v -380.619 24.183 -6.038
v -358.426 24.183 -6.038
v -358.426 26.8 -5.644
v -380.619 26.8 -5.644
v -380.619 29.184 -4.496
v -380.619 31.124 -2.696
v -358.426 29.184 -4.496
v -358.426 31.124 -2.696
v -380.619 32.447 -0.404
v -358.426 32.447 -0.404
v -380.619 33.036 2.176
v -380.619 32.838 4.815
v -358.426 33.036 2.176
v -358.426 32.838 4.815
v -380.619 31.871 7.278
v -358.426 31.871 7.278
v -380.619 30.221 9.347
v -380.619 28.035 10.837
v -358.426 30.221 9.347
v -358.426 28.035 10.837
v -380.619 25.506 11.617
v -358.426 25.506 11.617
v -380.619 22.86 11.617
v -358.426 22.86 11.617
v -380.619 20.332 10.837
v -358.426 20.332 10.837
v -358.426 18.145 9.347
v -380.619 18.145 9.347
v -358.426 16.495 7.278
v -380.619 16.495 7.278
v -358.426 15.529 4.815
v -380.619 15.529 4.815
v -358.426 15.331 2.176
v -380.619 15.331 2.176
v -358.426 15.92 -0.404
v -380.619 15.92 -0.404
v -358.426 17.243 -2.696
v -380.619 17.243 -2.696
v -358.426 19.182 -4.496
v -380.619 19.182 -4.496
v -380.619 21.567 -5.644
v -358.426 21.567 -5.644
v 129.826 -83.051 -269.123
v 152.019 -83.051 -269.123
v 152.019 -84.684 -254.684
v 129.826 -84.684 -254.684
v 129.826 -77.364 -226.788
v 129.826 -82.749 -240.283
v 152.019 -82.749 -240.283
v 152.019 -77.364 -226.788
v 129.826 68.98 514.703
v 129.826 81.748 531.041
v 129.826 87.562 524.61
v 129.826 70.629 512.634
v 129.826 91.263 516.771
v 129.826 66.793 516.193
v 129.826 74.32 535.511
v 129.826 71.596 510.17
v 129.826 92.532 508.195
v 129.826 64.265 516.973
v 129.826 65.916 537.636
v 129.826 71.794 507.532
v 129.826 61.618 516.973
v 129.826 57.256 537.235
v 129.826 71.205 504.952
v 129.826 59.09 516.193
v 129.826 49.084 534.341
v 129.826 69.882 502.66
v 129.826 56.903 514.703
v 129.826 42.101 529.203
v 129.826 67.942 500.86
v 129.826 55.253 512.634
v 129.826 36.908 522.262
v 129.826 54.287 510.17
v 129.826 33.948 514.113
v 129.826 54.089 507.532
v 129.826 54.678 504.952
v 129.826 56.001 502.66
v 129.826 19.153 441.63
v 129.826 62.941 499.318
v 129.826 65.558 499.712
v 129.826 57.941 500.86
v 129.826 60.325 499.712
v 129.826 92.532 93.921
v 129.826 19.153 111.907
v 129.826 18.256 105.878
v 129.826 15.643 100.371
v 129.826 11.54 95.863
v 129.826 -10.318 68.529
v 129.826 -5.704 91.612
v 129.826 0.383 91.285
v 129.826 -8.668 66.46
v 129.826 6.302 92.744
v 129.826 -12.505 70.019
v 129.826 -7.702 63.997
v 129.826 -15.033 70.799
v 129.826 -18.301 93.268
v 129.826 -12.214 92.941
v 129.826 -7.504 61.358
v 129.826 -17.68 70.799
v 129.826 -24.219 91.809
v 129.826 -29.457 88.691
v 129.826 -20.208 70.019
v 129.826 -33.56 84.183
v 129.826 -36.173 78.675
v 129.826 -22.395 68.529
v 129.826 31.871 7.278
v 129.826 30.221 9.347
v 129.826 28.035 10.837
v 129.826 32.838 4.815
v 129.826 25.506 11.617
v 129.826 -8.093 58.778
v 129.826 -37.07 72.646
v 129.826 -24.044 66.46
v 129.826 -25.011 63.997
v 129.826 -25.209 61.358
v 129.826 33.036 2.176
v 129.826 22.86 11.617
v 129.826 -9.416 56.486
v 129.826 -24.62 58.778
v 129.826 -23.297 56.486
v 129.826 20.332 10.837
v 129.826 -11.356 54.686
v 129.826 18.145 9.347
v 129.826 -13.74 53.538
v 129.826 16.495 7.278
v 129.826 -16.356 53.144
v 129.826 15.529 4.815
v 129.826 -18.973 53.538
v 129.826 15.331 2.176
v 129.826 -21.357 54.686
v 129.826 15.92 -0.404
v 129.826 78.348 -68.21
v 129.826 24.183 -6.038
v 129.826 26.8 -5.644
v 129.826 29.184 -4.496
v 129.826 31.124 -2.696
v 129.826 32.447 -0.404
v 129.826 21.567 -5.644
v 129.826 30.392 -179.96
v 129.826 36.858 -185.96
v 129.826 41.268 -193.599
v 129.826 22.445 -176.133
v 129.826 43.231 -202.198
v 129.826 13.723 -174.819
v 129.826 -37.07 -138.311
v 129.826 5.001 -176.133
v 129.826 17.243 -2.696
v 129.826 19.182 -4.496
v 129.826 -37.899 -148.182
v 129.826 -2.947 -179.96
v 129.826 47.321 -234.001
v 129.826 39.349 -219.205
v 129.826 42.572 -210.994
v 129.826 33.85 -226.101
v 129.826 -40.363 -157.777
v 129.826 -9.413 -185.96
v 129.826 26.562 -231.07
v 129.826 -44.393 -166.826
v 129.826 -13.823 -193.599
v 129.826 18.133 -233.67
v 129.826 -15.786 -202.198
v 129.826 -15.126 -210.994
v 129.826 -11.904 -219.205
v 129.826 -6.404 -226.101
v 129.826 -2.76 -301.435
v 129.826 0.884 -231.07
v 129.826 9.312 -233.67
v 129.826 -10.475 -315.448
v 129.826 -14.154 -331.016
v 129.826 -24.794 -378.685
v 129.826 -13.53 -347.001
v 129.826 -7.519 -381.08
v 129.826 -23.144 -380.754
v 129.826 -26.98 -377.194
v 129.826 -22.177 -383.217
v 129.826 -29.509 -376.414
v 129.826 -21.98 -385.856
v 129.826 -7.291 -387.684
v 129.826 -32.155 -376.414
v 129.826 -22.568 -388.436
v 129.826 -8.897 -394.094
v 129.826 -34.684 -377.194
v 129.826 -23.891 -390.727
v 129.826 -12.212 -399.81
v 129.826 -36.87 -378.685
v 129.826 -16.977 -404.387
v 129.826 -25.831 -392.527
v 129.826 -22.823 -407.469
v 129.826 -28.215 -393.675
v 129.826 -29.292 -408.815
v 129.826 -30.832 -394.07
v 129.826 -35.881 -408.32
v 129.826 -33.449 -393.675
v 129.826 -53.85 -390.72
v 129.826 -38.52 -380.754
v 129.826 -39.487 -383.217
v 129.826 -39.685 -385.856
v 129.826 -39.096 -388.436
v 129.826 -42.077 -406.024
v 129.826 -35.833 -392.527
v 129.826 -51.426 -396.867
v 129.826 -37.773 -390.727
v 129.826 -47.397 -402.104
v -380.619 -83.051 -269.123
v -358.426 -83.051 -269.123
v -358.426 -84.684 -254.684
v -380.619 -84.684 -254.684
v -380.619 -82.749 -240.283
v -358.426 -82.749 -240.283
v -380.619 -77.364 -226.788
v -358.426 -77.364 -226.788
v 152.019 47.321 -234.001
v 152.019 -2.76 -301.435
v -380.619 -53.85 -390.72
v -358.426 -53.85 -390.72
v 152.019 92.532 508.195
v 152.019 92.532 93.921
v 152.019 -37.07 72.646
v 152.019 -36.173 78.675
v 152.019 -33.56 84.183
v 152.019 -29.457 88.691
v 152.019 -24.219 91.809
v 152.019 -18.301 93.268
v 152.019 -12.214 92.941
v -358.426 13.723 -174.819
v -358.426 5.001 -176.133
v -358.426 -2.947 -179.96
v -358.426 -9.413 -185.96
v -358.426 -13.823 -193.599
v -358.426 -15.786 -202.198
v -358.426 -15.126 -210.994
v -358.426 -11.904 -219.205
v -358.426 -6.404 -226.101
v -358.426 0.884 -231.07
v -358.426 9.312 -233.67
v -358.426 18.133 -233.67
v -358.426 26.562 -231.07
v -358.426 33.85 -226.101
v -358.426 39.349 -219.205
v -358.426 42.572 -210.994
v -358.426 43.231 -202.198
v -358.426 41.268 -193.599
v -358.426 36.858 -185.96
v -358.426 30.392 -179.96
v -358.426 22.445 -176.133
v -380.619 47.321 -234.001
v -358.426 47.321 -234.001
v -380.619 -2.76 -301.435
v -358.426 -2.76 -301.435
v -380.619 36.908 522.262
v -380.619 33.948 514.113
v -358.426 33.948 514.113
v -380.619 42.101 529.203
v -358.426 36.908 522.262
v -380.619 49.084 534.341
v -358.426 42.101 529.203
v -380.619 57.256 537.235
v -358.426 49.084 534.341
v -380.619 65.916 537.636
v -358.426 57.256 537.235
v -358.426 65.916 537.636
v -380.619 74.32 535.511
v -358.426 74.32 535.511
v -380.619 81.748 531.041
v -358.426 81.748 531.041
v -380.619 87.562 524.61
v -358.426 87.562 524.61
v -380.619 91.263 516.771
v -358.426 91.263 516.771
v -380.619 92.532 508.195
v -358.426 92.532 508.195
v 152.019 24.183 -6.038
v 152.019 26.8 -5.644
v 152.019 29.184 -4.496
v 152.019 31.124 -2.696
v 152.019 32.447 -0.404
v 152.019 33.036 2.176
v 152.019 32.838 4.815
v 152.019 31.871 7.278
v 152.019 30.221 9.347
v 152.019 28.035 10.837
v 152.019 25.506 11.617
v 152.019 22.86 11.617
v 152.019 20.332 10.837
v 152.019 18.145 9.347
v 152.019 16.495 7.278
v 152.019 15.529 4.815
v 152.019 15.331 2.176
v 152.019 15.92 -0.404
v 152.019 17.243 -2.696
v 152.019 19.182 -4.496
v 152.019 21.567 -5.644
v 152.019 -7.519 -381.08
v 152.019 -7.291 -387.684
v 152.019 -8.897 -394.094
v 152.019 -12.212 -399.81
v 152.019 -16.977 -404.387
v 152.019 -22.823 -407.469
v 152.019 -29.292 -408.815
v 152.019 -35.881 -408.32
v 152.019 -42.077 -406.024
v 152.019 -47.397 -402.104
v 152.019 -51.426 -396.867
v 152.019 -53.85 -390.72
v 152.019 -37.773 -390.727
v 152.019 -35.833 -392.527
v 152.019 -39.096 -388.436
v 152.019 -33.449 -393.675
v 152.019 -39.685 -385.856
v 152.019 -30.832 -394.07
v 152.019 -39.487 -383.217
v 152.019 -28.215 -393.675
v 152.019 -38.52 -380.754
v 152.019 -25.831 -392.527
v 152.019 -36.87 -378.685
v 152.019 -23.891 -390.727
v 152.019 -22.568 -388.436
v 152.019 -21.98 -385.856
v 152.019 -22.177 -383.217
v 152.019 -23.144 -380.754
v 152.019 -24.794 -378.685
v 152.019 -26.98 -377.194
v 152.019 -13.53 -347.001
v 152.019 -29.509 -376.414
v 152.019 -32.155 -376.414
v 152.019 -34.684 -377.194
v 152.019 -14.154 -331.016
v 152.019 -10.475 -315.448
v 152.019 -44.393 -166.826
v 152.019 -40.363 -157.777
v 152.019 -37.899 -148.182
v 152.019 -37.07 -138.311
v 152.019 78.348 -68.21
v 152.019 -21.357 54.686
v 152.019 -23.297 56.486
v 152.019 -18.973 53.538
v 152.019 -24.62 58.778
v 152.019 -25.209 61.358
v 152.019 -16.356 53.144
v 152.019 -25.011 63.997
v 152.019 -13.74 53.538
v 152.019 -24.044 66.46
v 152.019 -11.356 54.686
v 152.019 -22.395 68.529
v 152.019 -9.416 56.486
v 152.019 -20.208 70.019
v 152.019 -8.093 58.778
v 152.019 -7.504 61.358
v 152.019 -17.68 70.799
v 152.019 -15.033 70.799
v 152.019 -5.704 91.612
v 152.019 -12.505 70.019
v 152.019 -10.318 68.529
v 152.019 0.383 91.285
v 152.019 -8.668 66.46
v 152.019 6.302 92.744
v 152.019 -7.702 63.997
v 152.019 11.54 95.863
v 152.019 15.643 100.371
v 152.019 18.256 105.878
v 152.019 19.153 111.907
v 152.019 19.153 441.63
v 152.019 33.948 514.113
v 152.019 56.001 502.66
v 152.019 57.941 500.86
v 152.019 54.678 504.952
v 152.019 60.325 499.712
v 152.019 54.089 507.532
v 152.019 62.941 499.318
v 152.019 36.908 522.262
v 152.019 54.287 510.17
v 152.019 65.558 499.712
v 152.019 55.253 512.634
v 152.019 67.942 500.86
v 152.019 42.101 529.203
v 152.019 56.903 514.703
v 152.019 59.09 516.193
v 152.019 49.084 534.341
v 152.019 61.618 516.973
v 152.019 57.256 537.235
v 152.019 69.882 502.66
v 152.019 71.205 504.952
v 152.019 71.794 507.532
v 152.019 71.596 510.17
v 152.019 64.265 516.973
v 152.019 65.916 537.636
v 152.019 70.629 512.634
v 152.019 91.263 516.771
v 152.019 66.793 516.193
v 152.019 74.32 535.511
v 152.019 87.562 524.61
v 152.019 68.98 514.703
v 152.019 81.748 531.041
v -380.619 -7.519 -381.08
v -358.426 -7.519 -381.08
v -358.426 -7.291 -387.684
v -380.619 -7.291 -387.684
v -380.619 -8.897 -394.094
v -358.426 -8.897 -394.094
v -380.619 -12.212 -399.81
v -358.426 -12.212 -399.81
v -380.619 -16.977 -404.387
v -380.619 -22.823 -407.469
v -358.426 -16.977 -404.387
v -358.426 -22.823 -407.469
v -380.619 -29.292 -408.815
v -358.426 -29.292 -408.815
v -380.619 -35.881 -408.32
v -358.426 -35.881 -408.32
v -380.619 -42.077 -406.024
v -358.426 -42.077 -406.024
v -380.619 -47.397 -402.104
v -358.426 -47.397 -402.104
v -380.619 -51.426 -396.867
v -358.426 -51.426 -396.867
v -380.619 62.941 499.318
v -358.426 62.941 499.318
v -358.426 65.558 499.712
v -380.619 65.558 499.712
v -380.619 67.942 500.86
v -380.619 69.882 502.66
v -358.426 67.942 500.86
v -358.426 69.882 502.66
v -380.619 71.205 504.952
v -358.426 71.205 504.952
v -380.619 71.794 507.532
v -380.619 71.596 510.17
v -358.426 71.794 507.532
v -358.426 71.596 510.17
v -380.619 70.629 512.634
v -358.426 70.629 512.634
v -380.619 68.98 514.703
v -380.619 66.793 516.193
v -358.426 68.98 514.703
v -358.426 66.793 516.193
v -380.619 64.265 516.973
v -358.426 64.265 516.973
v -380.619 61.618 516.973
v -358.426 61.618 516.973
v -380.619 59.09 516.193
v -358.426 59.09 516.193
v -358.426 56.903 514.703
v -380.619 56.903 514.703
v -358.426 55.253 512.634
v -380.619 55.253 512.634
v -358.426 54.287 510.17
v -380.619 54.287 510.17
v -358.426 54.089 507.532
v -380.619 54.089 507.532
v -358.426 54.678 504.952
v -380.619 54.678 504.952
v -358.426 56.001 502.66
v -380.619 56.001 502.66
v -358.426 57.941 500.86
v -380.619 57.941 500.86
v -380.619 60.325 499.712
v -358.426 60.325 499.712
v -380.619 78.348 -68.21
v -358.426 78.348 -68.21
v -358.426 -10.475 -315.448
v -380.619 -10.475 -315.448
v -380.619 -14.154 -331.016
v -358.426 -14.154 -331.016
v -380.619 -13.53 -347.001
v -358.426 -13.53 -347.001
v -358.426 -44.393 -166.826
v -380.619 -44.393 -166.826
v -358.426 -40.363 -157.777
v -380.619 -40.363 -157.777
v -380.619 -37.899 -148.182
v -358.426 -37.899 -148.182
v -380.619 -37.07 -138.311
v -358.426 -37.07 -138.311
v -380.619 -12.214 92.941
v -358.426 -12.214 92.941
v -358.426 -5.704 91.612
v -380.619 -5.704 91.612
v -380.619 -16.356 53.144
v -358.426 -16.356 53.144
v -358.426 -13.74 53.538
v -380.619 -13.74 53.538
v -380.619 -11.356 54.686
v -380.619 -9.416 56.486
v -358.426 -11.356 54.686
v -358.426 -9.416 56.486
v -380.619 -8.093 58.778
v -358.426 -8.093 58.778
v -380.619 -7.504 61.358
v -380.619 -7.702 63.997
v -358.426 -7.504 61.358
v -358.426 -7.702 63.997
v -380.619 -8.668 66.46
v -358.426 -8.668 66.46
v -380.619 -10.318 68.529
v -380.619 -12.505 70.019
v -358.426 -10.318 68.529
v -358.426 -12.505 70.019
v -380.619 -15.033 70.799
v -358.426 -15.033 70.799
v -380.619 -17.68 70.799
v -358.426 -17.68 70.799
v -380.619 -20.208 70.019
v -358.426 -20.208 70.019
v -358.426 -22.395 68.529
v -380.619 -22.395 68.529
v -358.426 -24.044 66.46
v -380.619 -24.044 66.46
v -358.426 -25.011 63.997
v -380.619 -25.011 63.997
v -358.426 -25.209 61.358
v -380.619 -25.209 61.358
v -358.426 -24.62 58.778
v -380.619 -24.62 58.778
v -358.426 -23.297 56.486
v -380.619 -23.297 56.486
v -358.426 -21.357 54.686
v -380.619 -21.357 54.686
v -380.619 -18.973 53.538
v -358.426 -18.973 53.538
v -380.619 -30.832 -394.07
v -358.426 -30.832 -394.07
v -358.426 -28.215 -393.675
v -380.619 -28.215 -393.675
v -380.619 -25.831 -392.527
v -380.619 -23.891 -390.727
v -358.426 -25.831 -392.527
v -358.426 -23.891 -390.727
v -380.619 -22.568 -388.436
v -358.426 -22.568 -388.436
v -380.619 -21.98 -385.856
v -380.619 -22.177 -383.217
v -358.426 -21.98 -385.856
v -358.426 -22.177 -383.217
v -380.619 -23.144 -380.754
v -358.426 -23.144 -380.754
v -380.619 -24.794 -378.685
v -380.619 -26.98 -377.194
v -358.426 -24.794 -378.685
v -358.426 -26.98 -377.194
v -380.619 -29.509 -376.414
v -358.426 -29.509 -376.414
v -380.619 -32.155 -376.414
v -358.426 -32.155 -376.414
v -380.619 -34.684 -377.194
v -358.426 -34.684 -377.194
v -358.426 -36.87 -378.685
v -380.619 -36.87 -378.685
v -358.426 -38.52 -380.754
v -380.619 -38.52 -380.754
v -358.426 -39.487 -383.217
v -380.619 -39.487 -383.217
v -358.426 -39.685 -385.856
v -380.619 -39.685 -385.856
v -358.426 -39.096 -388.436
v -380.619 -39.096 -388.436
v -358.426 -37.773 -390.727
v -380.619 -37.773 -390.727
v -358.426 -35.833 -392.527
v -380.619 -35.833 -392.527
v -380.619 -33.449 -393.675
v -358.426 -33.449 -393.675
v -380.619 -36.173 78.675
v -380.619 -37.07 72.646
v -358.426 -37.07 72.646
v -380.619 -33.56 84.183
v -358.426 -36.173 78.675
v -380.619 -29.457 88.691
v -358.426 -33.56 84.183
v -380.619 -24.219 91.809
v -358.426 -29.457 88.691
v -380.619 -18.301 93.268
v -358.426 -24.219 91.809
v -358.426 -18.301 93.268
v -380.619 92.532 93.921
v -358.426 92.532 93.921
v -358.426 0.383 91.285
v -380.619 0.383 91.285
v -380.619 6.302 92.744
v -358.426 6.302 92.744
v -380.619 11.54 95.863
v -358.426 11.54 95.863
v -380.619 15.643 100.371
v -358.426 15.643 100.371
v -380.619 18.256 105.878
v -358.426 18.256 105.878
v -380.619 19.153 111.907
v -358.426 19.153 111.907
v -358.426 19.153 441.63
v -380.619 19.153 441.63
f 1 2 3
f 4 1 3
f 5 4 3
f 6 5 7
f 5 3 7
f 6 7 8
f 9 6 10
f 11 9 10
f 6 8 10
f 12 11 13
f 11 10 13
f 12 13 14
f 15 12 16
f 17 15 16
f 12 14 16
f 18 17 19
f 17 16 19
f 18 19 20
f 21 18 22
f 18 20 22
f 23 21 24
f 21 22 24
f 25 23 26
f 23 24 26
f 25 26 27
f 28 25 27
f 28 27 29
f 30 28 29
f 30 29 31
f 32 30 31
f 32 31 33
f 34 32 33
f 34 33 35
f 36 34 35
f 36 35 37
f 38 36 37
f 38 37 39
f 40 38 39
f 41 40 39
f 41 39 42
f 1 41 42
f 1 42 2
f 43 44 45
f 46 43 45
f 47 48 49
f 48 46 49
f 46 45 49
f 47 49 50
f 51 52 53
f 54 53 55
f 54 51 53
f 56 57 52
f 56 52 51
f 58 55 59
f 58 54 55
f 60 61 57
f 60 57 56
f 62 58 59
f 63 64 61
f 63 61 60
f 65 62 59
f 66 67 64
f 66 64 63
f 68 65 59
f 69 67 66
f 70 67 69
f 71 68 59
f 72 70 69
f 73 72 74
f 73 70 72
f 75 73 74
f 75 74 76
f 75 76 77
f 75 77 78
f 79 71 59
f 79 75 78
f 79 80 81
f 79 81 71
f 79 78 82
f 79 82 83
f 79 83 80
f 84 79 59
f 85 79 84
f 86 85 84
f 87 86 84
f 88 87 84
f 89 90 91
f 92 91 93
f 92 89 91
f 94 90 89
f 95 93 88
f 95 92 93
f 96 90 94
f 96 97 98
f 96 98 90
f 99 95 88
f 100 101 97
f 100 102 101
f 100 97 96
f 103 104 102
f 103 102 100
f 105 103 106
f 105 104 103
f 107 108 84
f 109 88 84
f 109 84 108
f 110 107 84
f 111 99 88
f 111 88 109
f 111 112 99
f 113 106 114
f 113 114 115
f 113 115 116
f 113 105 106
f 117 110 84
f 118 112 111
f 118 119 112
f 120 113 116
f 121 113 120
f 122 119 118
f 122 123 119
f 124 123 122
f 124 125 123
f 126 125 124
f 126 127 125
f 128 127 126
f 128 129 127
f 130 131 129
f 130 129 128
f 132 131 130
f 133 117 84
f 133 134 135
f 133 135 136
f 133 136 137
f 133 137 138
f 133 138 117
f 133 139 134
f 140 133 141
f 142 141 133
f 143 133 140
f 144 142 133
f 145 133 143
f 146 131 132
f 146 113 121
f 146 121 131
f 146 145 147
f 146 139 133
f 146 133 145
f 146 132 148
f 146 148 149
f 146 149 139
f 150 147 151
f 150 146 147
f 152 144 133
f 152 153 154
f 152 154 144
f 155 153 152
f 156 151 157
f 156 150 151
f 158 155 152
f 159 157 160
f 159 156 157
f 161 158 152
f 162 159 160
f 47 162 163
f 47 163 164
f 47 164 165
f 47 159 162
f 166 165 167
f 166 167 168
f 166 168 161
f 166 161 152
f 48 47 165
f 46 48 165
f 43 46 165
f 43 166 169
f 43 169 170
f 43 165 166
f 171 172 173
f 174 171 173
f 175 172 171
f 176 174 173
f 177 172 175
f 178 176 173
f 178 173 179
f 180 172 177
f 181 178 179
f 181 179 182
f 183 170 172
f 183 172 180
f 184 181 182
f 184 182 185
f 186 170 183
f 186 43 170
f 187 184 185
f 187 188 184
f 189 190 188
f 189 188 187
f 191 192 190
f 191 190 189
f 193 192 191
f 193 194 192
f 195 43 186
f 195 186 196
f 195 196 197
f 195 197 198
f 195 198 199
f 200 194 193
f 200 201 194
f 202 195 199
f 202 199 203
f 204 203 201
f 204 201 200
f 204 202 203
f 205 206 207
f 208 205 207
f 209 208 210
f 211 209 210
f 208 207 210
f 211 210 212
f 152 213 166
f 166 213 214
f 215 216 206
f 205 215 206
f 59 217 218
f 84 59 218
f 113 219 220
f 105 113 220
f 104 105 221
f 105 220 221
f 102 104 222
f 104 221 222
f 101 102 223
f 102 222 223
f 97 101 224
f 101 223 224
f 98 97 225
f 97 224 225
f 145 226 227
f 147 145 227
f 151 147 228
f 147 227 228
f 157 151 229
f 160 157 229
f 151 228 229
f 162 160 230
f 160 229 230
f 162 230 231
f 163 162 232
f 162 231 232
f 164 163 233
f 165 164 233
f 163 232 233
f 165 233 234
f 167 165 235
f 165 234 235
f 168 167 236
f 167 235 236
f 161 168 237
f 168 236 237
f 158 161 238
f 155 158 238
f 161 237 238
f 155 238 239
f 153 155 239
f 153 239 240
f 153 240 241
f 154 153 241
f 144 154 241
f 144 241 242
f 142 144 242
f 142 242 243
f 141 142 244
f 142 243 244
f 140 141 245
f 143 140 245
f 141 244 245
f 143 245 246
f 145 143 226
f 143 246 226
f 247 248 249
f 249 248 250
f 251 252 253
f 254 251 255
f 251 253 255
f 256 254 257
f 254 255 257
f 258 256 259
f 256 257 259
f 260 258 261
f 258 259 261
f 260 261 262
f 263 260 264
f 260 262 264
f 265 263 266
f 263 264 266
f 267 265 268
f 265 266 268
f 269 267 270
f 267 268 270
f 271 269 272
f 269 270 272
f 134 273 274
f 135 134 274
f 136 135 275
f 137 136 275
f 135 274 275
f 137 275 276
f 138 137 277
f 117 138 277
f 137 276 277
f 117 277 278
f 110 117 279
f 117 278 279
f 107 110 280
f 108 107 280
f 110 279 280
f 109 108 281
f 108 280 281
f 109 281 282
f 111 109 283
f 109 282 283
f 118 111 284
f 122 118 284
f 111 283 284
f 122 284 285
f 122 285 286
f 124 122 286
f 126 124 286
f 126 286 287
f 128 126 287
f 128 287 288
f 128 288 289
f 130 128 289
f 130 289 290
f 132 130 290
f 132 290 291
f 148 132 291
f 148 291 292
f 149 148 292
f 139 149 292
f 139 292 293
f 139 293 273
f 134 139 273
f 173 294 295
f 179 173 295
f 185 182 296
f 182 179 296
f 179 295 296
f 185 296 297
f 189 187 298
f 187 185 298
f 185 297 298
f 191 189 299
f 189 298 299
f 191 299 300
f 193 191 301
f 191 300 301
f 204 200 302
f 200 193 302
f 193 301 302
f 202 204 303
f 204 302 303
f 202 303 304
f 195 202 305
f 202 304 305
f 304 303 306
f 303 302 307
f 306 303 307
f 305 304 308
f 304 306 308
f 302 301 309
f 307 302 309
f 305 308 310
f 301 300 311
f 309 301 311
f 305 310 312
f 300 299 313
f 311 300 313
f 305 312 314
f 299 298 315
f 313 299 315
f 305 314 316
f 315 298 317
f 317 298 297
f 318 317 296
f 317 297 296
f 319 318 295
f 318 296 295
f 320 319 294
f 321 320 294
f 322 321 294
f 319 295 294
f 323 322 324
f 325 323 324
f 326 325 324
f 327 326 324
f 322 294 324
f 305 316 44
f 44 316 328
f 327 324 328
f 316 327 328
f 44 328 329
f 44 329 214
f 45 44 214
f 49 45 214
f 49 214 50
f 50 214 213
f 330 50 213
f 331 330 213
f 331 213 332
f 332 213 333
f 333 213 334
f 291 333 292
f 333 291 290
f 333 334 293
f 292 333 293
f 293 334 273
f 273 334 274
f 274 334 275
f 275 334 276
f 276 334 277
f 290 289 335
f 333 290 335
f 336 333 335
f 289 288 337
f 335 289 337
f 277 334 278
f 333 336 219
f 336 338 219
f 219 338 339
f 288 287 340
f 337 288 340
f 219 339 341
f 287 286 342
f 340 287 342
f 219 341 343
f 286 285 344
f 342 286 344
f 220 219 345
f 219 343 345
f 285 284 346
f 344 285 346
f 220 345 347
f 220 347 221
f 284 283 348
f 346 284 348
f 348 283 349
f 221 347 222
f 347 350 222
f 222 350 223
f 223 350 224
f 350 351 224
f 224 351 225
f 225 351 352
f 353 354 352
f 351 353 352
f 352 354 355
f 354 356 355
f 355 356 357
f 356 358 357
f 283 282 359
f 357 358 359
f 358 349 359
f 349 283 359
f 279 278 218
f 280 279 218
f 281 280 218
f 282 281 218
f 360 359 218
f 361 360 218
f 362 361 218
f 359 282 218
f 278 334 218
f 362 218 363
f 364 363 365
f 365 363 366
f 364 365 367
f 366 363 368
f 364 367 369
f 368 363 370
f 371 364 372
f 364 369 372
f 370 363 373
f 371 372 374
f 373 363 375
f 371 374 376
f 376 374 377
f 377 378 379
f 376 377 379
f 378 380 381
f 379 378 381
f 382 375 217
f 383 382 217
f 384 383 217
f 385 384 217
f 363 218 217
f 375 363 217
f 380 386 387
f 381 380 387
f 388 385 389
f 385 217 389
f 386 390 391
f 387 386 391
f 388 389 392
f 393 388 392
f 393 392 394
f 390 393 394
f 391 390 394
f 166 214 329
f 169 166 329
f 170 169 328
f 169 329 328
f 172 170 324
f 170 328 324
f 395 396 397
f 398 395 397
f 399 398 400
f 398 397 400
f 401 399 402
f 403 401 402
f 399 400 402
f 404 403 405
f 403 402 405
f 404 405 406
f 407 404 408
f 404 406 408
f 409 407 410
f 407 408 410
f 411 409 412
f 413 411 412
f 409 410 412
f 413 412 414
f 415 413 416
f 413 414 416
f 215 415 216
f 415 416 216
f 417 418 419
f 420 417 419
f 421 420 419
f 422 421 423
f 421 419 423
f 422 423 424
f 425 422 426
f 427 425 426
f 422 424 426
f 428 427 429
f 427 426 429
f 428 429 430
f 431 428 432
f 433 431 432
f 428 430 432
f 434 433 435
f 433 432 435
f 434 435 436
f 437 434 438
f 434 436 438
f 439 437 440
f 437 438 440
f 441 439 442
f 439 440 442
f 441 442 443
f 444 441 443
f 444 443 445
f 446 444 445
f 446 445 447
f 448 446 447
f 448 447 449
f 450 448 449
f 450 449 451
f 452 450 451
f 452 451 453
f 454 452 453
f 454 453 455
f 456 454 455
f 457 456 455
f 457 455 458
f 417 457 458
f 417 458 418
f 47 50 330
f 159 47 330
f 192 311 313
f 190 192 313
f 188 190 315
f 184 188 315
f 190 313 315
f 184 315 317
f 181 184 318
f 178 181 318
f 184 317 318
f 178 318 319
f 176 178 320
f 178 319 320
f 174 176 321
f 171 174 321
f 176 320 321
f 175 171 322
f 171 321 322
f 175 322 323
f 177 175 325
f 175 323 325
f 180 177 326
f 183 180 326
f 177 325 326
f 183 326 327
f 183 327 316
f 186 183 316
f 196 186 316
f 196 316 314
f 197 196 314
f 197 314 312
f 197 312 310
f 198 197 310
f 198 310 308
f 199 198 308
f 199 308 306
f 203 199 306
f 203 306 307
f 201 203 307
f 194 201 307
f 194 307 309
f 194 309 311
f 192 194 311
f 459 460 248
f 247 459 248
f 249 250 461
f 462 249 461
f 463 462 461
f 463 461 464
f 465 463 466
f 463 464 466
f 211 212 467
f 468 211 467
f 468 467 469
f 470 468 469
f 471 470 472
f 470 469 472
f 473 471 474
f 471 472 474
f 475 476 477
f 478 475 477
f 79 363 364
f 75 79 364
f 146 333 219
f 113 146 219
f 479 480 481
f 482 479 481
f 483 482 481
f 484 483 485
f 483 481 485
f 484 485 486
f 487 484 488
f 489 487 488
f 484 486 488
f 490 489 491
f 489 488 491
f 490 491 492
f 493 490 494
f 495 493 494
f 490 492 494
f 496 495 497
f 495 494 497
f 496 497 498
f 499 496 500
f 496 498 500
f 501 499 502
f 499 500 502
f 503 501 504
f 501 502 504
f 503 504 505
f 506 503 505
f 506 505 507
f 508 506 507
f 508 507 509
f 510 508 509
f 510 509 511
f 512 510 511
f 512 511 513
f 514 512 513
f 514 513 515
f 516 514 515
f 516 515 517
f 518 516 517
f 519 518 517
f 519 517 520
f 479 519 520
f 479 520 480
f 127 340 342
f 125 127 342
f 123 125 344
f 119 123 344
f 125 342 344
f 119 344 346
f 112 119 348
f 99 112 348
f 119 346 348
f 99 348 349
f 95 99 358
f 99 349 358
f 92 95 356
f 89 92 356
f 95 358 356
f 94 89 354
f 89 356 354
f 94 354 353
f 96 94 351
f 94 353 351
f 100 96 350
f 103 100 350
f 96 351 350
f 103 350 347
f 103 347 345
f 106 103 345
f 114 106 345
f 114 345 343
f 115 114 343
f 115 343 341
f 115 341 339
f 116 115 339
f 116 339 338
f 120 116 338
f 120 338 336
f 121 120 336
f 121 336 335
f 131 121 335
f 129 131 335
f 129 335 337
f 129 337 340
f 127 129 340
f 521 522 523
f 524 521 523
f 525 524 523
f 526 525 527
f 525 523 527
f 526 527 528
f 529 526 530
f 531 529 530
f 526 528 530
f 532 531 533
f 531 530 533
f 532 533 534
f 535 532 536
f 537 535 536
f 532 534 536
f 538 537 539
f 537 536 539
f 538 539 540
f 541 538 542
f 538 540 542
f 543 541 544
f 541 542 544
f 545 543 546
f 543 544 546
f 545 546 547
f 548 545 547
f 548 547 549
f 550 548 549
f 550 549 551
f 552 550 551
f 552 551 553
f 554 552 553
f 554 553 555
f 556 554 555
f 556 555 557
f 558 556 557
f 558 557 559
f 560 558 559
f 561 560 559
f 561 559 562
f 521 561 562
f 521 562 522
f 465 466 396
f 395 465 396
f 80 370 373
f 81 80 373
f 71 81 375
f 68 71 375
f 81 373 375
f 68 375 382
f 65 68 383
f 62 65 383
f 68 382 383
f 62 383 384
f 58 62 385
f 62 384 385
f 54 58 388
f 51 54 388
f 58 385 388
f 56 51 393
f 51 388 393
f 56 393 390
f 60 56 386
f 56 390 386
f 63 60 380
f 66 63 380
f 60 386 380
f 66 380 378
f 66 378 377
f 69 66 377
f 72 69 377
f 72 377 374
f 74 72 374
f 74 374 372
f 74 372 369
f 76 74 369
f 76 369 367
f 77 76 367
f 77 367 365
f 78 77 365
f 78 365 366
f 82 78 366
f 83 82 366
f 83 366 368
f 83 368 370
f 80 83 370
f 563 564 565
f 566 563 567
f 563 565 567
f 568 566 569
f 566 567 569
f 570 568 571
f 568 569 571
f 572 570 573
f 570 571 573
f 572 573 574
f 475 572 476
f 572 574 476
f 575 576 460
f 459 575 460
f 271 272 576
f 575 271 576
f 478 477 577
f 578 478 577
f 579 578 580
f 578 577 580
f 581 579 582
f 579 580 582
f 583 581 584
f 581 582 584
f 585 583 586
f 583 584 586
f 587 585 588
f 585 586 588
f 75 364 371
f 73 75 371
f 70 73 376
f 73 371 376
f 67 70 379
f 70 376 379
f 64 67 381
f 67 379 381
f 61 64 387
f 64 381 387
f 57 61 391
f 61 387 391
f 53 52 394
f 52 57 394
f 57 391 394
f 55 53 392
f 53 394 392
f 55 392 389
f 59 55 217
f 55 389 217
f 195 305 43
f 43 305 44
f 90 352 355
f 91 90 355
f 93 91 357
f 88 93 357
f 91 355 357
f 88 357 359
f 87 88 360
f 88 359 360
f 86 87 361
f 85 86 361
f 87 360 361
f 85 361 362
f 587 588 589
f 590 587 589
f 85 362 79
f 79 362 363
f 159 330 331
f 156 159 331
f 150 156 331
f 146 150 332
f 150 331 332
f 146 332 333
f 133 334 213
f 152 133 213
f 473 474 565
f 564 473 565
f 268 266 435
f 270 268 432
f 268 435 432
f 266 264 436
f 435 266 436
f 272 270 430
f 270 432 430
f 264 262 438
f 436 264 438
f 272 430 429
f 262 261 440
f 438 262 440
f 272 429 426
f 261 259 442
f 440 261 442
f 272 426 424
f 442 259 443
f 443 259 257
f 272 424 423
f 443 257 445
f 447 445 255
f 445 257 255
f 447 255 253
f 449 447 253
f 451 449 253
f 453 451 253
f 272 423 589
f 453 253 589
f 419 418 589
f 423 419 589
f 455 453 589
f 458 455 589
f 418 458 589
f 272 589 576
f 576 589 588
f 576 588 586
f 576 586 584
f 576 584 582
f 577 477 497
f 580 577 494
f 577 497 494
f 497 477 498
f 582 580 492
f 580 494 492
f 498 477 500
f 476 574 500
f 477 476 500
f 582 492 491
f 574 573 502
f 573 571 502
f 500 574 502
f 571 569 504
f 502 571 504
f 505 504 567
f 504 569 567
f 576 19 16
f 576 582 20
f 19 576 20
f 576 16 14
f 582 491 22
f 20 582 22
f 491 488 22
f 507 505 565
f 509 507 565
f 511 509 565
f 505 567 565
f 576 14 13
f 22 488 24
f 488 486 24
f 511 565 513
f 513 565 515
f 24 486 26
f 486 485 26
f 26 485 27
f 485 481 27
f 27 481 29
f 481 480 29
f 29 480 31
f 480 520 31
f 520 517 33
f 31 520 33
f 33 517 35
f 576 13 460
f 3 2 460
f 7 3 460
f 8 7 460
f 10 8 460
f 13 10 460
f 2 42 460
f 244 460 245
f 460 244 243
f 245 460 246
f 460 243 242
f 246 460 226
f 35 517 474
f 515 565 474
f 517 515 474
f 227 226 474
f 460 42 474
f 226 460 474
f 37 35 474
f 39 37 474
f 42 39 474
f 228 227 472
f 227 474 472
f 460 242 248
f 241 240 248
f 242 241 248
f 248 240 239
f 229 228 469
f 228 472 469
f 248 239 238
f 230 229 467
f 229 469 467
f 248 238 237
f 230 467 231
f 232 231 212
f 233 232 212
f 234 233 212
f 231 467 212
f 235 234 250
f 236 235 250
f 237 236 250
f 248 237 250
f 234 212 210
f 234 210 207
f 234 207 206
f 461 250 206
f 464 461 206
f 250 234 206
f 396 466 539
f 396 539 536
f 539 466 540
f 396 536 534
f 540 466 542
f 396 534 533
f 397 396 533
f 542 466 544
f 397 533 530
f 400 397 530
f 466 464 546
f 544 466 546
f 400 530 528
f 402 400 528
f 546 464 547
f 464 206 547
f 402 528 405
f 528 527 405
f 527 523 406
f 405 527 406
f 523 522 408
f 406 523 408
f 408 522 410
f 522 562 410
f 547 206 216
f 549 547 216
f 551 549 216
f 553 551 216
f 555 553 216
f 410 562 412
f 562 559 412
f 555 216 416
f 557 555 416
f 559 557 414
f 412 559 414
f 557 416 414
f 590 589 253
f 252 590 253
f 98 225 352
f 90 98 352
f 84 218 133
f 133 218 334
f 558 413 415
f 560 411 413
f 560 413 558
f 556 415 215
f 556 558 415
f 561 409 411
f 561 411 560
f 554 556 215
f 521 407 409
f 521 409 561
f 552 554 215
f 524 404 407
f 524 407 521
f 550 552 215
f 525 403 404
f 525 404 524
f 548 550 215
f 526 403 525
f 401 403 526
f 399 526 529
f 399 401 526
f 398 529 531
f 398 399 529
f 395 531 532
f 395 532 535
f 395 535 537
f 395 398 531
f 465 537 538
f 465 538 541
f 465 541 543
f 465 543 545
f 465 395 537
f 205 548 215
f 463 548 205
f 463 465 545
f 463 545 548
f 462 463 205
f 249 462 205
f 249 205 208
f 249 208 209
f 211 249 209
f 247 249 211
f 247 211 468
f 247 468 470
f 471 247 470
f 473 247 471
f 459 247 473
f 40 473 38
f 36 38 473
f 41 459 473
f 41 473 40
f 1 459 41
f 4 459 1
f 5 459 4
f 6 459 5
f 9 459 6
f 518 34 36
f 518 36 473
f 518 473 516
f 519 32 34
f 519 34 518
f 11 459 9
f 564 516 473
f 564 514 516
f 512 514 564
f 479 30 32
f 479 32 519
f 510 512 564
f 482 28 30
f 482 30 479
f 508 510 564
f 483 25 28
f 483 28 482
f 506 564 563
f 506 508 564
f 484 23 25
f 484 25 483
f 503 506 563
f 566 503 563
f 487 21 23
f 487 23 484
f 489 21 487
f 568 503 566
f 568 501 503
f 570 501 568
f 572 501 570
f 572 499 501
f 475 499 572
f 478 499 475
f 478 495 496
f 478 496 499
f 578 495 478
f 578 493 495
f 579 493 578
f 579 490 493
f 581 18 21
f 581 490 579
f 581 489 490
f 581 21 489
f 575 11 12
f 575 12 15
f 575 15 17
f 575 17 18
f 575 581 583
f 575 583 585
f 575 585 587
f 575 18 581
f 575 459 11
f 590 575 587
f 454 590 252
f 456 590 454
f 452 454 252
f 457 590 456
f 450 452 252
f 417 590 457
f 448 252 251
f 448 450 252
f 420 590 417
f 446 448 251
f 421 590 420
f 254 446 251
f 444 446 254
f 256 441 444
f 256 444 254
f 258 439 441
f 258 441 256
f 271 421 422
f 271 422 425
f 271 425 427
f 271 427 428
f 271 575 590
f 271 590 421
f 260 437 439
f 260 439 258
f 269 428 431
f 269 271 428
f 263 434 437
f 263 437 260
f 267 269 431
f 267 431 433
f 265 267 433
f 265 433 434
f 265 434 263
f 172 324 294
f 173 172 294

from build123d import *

# Parameters (mm, degrees)
SKETCH1_R               = 3.81
BOSS_EXTRUDE2_DEPTH     = 228.6
CUT_EXTRUDE1_DEPTH      = 319.859436188
CUT_EXTRUDE1_DEPTH_BACK = 319.859436188
SKETCH3_W               = 209.55
SKETCH3_H               = 457.691503211
SKETCH4_R               = 12.7
BOSS_EXTRUDE3_DEPTH     = 209.55
SCALE1_SCALE            = 2.33


with BuildPart() as part:
    # Sketch1 → Boss-Extrude2 (new body)
    with BuildSketch(Plane(origin=(0, 0, 0), x_dir=(0, 0, -1), z_dir=(1, 0, 0))):
        with BuildLine():
            Line((-203.426935692, 51.985841481), (-25.626935692, 51.985841481))
            Line((-25.626935692, 51.985841481), (43.95726397, 45.89801285))
            Line((43.95726397, 45.89801285), (115.111953895, 32.581774579))
            Line((115.111953895, 32.581774579), (144.05370572, 11.087732787))
            ThreePointArc((144.05370572, 11.087732787), (153.355215288, 6.760397028), (163.609819182, 6.46541568))
            Line((163.609819182, 6.46541568), (178.236347054, 9.045273838))
            ThreePointArc((178.236347054, 9.045273838), (189.948133915, 1.109278265), (182.373529856, -10.839418341))
            Line((182.373529856, -10.839418341), (130.185840083, -23.371799314))
            ThreePointArc((130.185840083, -23.371799314), (120.873250401, -23.847836103), (112.016417856, -20.931081935))
            Line((112.016417856, -20.931081935), (86.281753804, -6.780434321))
            ThreePointArc((86.281753804, -6.780434321), (80.361073143, -4.435827092), (74.043286945, -3.637566412))
            Line((74.043286945, -3.637566412), (-16.495949676, -3.637566412))
            ThreePointArc((-16.495949676, -3.637566412), (-23.382114066, -0.370096092), (-25.206335201, 7.030433588))
            Line((-25.206335201, 7.030433588), (-24.63601234, 9.824433588))
            ThreePointArc((-24.63601234, 9.824433588), (-26.460233475, 17.224963268), (-33.346397865, 20.492433588))
            Line((-33.346397865, 20.492433588), (-174.858415958, 20.492433588))
            Line((-174.858415958, 20.492433588), (-205.966935692, 26.842433588))
            ThreePointArc((-205.966935692, 26.842433588), (-216.062624835, 40.562305299), (-203.426935692, 51.985841481))
        make_face()
        with Locations((-203.426935692, 39.285841481)):
            Circle(SKETCH1_R, mode=Mode.SUBTRACT)
        with Locations((-11.93601234, 5.252433588)):
            Circle(SKETCH1_R, mode=Mode.SUBTRACT)
        with Locations((13.46398766, 22.651433588)):
            Circle(SKETCH1_R, mode=Mode.SUBTRACT)
        with Locations((180.001147709, -0.960278553)):
            Circle(SKETCH1_R, mode=Mode.SUBTRACT)
    extrude(amount=-BOSS_EXTRUDE2_DEPTH)

    # Sketch3 → Cut-Extrude1 (cut, two sides: drawn at the far end of the back side and taken through both)
    with BuildSketch(Plane(origin=(0, 0, 0), x_dir=(1, 0, 0), z_dir=(0, 1, 0)).offset(-CUT_EXTRUDE1_DEPTH_BACK)):
        with Locations((-114.3, -18.881102173)):
            Rectangle(SKETCH3_W, SKETCH3_H)
    extrude(amount=CUT_EXTRUDE1_DEPTH + CUT_EXTRUDE1_DEPTH_BACK, mode=Mode.SUBTRACT)


with BuildPart() as cut_extrude1_piece_1:
    # of the separate pieces the step leaves, piece 1, a body of its own (cut_extrude1_pieces)
    add(part.part.solids().sort_by_distance((0, 51.985841481, 203.426935692))[0])



with BuildPart() as cut_extrude1_piece_2:
    # of the separate pieces the step leaves, piece 2, a body of its own (cut_extrude1_pieces)
    add(part.part.solids().sort_by_distance((-219.075, 51.985841481, 203.426935692))[0])


with BuildPart() as cut_extrude1_piece_1_1:
    add(cut_extrude1_piece_1.part)

    add(cut_extrude1_piece_2.part)  # Boss-Extrude3 merges Cut-Extrude1 piece 2
    # Sketch4 → Boss-Extrude3 (add)
    with BuildSketch(Plane(origin=(-219.075, 0, 0), x_dir=(0, 0, -1), z_dir=(1, 0, 0))):
        with Locations(Location((102.411953895, 18.161886375, 0), (0, 0, 180))):
            Circle(SKETCH4_R)
    extrude(amount=BOSS_EXTRUDE3_DEPTH)


with BuildPart() as cut_extrude1_piece_1_2:
    # Scale1: scaled about (-114.3, 21.499691493, -25.72204861)
    add(cut_extrude1_piece_1_1.part.scale(SCALE1_SCALE).moved(Location((152.019, -28.594589686, 34.210324651))))


solid = cut_extrude1_piece_1_2.part
